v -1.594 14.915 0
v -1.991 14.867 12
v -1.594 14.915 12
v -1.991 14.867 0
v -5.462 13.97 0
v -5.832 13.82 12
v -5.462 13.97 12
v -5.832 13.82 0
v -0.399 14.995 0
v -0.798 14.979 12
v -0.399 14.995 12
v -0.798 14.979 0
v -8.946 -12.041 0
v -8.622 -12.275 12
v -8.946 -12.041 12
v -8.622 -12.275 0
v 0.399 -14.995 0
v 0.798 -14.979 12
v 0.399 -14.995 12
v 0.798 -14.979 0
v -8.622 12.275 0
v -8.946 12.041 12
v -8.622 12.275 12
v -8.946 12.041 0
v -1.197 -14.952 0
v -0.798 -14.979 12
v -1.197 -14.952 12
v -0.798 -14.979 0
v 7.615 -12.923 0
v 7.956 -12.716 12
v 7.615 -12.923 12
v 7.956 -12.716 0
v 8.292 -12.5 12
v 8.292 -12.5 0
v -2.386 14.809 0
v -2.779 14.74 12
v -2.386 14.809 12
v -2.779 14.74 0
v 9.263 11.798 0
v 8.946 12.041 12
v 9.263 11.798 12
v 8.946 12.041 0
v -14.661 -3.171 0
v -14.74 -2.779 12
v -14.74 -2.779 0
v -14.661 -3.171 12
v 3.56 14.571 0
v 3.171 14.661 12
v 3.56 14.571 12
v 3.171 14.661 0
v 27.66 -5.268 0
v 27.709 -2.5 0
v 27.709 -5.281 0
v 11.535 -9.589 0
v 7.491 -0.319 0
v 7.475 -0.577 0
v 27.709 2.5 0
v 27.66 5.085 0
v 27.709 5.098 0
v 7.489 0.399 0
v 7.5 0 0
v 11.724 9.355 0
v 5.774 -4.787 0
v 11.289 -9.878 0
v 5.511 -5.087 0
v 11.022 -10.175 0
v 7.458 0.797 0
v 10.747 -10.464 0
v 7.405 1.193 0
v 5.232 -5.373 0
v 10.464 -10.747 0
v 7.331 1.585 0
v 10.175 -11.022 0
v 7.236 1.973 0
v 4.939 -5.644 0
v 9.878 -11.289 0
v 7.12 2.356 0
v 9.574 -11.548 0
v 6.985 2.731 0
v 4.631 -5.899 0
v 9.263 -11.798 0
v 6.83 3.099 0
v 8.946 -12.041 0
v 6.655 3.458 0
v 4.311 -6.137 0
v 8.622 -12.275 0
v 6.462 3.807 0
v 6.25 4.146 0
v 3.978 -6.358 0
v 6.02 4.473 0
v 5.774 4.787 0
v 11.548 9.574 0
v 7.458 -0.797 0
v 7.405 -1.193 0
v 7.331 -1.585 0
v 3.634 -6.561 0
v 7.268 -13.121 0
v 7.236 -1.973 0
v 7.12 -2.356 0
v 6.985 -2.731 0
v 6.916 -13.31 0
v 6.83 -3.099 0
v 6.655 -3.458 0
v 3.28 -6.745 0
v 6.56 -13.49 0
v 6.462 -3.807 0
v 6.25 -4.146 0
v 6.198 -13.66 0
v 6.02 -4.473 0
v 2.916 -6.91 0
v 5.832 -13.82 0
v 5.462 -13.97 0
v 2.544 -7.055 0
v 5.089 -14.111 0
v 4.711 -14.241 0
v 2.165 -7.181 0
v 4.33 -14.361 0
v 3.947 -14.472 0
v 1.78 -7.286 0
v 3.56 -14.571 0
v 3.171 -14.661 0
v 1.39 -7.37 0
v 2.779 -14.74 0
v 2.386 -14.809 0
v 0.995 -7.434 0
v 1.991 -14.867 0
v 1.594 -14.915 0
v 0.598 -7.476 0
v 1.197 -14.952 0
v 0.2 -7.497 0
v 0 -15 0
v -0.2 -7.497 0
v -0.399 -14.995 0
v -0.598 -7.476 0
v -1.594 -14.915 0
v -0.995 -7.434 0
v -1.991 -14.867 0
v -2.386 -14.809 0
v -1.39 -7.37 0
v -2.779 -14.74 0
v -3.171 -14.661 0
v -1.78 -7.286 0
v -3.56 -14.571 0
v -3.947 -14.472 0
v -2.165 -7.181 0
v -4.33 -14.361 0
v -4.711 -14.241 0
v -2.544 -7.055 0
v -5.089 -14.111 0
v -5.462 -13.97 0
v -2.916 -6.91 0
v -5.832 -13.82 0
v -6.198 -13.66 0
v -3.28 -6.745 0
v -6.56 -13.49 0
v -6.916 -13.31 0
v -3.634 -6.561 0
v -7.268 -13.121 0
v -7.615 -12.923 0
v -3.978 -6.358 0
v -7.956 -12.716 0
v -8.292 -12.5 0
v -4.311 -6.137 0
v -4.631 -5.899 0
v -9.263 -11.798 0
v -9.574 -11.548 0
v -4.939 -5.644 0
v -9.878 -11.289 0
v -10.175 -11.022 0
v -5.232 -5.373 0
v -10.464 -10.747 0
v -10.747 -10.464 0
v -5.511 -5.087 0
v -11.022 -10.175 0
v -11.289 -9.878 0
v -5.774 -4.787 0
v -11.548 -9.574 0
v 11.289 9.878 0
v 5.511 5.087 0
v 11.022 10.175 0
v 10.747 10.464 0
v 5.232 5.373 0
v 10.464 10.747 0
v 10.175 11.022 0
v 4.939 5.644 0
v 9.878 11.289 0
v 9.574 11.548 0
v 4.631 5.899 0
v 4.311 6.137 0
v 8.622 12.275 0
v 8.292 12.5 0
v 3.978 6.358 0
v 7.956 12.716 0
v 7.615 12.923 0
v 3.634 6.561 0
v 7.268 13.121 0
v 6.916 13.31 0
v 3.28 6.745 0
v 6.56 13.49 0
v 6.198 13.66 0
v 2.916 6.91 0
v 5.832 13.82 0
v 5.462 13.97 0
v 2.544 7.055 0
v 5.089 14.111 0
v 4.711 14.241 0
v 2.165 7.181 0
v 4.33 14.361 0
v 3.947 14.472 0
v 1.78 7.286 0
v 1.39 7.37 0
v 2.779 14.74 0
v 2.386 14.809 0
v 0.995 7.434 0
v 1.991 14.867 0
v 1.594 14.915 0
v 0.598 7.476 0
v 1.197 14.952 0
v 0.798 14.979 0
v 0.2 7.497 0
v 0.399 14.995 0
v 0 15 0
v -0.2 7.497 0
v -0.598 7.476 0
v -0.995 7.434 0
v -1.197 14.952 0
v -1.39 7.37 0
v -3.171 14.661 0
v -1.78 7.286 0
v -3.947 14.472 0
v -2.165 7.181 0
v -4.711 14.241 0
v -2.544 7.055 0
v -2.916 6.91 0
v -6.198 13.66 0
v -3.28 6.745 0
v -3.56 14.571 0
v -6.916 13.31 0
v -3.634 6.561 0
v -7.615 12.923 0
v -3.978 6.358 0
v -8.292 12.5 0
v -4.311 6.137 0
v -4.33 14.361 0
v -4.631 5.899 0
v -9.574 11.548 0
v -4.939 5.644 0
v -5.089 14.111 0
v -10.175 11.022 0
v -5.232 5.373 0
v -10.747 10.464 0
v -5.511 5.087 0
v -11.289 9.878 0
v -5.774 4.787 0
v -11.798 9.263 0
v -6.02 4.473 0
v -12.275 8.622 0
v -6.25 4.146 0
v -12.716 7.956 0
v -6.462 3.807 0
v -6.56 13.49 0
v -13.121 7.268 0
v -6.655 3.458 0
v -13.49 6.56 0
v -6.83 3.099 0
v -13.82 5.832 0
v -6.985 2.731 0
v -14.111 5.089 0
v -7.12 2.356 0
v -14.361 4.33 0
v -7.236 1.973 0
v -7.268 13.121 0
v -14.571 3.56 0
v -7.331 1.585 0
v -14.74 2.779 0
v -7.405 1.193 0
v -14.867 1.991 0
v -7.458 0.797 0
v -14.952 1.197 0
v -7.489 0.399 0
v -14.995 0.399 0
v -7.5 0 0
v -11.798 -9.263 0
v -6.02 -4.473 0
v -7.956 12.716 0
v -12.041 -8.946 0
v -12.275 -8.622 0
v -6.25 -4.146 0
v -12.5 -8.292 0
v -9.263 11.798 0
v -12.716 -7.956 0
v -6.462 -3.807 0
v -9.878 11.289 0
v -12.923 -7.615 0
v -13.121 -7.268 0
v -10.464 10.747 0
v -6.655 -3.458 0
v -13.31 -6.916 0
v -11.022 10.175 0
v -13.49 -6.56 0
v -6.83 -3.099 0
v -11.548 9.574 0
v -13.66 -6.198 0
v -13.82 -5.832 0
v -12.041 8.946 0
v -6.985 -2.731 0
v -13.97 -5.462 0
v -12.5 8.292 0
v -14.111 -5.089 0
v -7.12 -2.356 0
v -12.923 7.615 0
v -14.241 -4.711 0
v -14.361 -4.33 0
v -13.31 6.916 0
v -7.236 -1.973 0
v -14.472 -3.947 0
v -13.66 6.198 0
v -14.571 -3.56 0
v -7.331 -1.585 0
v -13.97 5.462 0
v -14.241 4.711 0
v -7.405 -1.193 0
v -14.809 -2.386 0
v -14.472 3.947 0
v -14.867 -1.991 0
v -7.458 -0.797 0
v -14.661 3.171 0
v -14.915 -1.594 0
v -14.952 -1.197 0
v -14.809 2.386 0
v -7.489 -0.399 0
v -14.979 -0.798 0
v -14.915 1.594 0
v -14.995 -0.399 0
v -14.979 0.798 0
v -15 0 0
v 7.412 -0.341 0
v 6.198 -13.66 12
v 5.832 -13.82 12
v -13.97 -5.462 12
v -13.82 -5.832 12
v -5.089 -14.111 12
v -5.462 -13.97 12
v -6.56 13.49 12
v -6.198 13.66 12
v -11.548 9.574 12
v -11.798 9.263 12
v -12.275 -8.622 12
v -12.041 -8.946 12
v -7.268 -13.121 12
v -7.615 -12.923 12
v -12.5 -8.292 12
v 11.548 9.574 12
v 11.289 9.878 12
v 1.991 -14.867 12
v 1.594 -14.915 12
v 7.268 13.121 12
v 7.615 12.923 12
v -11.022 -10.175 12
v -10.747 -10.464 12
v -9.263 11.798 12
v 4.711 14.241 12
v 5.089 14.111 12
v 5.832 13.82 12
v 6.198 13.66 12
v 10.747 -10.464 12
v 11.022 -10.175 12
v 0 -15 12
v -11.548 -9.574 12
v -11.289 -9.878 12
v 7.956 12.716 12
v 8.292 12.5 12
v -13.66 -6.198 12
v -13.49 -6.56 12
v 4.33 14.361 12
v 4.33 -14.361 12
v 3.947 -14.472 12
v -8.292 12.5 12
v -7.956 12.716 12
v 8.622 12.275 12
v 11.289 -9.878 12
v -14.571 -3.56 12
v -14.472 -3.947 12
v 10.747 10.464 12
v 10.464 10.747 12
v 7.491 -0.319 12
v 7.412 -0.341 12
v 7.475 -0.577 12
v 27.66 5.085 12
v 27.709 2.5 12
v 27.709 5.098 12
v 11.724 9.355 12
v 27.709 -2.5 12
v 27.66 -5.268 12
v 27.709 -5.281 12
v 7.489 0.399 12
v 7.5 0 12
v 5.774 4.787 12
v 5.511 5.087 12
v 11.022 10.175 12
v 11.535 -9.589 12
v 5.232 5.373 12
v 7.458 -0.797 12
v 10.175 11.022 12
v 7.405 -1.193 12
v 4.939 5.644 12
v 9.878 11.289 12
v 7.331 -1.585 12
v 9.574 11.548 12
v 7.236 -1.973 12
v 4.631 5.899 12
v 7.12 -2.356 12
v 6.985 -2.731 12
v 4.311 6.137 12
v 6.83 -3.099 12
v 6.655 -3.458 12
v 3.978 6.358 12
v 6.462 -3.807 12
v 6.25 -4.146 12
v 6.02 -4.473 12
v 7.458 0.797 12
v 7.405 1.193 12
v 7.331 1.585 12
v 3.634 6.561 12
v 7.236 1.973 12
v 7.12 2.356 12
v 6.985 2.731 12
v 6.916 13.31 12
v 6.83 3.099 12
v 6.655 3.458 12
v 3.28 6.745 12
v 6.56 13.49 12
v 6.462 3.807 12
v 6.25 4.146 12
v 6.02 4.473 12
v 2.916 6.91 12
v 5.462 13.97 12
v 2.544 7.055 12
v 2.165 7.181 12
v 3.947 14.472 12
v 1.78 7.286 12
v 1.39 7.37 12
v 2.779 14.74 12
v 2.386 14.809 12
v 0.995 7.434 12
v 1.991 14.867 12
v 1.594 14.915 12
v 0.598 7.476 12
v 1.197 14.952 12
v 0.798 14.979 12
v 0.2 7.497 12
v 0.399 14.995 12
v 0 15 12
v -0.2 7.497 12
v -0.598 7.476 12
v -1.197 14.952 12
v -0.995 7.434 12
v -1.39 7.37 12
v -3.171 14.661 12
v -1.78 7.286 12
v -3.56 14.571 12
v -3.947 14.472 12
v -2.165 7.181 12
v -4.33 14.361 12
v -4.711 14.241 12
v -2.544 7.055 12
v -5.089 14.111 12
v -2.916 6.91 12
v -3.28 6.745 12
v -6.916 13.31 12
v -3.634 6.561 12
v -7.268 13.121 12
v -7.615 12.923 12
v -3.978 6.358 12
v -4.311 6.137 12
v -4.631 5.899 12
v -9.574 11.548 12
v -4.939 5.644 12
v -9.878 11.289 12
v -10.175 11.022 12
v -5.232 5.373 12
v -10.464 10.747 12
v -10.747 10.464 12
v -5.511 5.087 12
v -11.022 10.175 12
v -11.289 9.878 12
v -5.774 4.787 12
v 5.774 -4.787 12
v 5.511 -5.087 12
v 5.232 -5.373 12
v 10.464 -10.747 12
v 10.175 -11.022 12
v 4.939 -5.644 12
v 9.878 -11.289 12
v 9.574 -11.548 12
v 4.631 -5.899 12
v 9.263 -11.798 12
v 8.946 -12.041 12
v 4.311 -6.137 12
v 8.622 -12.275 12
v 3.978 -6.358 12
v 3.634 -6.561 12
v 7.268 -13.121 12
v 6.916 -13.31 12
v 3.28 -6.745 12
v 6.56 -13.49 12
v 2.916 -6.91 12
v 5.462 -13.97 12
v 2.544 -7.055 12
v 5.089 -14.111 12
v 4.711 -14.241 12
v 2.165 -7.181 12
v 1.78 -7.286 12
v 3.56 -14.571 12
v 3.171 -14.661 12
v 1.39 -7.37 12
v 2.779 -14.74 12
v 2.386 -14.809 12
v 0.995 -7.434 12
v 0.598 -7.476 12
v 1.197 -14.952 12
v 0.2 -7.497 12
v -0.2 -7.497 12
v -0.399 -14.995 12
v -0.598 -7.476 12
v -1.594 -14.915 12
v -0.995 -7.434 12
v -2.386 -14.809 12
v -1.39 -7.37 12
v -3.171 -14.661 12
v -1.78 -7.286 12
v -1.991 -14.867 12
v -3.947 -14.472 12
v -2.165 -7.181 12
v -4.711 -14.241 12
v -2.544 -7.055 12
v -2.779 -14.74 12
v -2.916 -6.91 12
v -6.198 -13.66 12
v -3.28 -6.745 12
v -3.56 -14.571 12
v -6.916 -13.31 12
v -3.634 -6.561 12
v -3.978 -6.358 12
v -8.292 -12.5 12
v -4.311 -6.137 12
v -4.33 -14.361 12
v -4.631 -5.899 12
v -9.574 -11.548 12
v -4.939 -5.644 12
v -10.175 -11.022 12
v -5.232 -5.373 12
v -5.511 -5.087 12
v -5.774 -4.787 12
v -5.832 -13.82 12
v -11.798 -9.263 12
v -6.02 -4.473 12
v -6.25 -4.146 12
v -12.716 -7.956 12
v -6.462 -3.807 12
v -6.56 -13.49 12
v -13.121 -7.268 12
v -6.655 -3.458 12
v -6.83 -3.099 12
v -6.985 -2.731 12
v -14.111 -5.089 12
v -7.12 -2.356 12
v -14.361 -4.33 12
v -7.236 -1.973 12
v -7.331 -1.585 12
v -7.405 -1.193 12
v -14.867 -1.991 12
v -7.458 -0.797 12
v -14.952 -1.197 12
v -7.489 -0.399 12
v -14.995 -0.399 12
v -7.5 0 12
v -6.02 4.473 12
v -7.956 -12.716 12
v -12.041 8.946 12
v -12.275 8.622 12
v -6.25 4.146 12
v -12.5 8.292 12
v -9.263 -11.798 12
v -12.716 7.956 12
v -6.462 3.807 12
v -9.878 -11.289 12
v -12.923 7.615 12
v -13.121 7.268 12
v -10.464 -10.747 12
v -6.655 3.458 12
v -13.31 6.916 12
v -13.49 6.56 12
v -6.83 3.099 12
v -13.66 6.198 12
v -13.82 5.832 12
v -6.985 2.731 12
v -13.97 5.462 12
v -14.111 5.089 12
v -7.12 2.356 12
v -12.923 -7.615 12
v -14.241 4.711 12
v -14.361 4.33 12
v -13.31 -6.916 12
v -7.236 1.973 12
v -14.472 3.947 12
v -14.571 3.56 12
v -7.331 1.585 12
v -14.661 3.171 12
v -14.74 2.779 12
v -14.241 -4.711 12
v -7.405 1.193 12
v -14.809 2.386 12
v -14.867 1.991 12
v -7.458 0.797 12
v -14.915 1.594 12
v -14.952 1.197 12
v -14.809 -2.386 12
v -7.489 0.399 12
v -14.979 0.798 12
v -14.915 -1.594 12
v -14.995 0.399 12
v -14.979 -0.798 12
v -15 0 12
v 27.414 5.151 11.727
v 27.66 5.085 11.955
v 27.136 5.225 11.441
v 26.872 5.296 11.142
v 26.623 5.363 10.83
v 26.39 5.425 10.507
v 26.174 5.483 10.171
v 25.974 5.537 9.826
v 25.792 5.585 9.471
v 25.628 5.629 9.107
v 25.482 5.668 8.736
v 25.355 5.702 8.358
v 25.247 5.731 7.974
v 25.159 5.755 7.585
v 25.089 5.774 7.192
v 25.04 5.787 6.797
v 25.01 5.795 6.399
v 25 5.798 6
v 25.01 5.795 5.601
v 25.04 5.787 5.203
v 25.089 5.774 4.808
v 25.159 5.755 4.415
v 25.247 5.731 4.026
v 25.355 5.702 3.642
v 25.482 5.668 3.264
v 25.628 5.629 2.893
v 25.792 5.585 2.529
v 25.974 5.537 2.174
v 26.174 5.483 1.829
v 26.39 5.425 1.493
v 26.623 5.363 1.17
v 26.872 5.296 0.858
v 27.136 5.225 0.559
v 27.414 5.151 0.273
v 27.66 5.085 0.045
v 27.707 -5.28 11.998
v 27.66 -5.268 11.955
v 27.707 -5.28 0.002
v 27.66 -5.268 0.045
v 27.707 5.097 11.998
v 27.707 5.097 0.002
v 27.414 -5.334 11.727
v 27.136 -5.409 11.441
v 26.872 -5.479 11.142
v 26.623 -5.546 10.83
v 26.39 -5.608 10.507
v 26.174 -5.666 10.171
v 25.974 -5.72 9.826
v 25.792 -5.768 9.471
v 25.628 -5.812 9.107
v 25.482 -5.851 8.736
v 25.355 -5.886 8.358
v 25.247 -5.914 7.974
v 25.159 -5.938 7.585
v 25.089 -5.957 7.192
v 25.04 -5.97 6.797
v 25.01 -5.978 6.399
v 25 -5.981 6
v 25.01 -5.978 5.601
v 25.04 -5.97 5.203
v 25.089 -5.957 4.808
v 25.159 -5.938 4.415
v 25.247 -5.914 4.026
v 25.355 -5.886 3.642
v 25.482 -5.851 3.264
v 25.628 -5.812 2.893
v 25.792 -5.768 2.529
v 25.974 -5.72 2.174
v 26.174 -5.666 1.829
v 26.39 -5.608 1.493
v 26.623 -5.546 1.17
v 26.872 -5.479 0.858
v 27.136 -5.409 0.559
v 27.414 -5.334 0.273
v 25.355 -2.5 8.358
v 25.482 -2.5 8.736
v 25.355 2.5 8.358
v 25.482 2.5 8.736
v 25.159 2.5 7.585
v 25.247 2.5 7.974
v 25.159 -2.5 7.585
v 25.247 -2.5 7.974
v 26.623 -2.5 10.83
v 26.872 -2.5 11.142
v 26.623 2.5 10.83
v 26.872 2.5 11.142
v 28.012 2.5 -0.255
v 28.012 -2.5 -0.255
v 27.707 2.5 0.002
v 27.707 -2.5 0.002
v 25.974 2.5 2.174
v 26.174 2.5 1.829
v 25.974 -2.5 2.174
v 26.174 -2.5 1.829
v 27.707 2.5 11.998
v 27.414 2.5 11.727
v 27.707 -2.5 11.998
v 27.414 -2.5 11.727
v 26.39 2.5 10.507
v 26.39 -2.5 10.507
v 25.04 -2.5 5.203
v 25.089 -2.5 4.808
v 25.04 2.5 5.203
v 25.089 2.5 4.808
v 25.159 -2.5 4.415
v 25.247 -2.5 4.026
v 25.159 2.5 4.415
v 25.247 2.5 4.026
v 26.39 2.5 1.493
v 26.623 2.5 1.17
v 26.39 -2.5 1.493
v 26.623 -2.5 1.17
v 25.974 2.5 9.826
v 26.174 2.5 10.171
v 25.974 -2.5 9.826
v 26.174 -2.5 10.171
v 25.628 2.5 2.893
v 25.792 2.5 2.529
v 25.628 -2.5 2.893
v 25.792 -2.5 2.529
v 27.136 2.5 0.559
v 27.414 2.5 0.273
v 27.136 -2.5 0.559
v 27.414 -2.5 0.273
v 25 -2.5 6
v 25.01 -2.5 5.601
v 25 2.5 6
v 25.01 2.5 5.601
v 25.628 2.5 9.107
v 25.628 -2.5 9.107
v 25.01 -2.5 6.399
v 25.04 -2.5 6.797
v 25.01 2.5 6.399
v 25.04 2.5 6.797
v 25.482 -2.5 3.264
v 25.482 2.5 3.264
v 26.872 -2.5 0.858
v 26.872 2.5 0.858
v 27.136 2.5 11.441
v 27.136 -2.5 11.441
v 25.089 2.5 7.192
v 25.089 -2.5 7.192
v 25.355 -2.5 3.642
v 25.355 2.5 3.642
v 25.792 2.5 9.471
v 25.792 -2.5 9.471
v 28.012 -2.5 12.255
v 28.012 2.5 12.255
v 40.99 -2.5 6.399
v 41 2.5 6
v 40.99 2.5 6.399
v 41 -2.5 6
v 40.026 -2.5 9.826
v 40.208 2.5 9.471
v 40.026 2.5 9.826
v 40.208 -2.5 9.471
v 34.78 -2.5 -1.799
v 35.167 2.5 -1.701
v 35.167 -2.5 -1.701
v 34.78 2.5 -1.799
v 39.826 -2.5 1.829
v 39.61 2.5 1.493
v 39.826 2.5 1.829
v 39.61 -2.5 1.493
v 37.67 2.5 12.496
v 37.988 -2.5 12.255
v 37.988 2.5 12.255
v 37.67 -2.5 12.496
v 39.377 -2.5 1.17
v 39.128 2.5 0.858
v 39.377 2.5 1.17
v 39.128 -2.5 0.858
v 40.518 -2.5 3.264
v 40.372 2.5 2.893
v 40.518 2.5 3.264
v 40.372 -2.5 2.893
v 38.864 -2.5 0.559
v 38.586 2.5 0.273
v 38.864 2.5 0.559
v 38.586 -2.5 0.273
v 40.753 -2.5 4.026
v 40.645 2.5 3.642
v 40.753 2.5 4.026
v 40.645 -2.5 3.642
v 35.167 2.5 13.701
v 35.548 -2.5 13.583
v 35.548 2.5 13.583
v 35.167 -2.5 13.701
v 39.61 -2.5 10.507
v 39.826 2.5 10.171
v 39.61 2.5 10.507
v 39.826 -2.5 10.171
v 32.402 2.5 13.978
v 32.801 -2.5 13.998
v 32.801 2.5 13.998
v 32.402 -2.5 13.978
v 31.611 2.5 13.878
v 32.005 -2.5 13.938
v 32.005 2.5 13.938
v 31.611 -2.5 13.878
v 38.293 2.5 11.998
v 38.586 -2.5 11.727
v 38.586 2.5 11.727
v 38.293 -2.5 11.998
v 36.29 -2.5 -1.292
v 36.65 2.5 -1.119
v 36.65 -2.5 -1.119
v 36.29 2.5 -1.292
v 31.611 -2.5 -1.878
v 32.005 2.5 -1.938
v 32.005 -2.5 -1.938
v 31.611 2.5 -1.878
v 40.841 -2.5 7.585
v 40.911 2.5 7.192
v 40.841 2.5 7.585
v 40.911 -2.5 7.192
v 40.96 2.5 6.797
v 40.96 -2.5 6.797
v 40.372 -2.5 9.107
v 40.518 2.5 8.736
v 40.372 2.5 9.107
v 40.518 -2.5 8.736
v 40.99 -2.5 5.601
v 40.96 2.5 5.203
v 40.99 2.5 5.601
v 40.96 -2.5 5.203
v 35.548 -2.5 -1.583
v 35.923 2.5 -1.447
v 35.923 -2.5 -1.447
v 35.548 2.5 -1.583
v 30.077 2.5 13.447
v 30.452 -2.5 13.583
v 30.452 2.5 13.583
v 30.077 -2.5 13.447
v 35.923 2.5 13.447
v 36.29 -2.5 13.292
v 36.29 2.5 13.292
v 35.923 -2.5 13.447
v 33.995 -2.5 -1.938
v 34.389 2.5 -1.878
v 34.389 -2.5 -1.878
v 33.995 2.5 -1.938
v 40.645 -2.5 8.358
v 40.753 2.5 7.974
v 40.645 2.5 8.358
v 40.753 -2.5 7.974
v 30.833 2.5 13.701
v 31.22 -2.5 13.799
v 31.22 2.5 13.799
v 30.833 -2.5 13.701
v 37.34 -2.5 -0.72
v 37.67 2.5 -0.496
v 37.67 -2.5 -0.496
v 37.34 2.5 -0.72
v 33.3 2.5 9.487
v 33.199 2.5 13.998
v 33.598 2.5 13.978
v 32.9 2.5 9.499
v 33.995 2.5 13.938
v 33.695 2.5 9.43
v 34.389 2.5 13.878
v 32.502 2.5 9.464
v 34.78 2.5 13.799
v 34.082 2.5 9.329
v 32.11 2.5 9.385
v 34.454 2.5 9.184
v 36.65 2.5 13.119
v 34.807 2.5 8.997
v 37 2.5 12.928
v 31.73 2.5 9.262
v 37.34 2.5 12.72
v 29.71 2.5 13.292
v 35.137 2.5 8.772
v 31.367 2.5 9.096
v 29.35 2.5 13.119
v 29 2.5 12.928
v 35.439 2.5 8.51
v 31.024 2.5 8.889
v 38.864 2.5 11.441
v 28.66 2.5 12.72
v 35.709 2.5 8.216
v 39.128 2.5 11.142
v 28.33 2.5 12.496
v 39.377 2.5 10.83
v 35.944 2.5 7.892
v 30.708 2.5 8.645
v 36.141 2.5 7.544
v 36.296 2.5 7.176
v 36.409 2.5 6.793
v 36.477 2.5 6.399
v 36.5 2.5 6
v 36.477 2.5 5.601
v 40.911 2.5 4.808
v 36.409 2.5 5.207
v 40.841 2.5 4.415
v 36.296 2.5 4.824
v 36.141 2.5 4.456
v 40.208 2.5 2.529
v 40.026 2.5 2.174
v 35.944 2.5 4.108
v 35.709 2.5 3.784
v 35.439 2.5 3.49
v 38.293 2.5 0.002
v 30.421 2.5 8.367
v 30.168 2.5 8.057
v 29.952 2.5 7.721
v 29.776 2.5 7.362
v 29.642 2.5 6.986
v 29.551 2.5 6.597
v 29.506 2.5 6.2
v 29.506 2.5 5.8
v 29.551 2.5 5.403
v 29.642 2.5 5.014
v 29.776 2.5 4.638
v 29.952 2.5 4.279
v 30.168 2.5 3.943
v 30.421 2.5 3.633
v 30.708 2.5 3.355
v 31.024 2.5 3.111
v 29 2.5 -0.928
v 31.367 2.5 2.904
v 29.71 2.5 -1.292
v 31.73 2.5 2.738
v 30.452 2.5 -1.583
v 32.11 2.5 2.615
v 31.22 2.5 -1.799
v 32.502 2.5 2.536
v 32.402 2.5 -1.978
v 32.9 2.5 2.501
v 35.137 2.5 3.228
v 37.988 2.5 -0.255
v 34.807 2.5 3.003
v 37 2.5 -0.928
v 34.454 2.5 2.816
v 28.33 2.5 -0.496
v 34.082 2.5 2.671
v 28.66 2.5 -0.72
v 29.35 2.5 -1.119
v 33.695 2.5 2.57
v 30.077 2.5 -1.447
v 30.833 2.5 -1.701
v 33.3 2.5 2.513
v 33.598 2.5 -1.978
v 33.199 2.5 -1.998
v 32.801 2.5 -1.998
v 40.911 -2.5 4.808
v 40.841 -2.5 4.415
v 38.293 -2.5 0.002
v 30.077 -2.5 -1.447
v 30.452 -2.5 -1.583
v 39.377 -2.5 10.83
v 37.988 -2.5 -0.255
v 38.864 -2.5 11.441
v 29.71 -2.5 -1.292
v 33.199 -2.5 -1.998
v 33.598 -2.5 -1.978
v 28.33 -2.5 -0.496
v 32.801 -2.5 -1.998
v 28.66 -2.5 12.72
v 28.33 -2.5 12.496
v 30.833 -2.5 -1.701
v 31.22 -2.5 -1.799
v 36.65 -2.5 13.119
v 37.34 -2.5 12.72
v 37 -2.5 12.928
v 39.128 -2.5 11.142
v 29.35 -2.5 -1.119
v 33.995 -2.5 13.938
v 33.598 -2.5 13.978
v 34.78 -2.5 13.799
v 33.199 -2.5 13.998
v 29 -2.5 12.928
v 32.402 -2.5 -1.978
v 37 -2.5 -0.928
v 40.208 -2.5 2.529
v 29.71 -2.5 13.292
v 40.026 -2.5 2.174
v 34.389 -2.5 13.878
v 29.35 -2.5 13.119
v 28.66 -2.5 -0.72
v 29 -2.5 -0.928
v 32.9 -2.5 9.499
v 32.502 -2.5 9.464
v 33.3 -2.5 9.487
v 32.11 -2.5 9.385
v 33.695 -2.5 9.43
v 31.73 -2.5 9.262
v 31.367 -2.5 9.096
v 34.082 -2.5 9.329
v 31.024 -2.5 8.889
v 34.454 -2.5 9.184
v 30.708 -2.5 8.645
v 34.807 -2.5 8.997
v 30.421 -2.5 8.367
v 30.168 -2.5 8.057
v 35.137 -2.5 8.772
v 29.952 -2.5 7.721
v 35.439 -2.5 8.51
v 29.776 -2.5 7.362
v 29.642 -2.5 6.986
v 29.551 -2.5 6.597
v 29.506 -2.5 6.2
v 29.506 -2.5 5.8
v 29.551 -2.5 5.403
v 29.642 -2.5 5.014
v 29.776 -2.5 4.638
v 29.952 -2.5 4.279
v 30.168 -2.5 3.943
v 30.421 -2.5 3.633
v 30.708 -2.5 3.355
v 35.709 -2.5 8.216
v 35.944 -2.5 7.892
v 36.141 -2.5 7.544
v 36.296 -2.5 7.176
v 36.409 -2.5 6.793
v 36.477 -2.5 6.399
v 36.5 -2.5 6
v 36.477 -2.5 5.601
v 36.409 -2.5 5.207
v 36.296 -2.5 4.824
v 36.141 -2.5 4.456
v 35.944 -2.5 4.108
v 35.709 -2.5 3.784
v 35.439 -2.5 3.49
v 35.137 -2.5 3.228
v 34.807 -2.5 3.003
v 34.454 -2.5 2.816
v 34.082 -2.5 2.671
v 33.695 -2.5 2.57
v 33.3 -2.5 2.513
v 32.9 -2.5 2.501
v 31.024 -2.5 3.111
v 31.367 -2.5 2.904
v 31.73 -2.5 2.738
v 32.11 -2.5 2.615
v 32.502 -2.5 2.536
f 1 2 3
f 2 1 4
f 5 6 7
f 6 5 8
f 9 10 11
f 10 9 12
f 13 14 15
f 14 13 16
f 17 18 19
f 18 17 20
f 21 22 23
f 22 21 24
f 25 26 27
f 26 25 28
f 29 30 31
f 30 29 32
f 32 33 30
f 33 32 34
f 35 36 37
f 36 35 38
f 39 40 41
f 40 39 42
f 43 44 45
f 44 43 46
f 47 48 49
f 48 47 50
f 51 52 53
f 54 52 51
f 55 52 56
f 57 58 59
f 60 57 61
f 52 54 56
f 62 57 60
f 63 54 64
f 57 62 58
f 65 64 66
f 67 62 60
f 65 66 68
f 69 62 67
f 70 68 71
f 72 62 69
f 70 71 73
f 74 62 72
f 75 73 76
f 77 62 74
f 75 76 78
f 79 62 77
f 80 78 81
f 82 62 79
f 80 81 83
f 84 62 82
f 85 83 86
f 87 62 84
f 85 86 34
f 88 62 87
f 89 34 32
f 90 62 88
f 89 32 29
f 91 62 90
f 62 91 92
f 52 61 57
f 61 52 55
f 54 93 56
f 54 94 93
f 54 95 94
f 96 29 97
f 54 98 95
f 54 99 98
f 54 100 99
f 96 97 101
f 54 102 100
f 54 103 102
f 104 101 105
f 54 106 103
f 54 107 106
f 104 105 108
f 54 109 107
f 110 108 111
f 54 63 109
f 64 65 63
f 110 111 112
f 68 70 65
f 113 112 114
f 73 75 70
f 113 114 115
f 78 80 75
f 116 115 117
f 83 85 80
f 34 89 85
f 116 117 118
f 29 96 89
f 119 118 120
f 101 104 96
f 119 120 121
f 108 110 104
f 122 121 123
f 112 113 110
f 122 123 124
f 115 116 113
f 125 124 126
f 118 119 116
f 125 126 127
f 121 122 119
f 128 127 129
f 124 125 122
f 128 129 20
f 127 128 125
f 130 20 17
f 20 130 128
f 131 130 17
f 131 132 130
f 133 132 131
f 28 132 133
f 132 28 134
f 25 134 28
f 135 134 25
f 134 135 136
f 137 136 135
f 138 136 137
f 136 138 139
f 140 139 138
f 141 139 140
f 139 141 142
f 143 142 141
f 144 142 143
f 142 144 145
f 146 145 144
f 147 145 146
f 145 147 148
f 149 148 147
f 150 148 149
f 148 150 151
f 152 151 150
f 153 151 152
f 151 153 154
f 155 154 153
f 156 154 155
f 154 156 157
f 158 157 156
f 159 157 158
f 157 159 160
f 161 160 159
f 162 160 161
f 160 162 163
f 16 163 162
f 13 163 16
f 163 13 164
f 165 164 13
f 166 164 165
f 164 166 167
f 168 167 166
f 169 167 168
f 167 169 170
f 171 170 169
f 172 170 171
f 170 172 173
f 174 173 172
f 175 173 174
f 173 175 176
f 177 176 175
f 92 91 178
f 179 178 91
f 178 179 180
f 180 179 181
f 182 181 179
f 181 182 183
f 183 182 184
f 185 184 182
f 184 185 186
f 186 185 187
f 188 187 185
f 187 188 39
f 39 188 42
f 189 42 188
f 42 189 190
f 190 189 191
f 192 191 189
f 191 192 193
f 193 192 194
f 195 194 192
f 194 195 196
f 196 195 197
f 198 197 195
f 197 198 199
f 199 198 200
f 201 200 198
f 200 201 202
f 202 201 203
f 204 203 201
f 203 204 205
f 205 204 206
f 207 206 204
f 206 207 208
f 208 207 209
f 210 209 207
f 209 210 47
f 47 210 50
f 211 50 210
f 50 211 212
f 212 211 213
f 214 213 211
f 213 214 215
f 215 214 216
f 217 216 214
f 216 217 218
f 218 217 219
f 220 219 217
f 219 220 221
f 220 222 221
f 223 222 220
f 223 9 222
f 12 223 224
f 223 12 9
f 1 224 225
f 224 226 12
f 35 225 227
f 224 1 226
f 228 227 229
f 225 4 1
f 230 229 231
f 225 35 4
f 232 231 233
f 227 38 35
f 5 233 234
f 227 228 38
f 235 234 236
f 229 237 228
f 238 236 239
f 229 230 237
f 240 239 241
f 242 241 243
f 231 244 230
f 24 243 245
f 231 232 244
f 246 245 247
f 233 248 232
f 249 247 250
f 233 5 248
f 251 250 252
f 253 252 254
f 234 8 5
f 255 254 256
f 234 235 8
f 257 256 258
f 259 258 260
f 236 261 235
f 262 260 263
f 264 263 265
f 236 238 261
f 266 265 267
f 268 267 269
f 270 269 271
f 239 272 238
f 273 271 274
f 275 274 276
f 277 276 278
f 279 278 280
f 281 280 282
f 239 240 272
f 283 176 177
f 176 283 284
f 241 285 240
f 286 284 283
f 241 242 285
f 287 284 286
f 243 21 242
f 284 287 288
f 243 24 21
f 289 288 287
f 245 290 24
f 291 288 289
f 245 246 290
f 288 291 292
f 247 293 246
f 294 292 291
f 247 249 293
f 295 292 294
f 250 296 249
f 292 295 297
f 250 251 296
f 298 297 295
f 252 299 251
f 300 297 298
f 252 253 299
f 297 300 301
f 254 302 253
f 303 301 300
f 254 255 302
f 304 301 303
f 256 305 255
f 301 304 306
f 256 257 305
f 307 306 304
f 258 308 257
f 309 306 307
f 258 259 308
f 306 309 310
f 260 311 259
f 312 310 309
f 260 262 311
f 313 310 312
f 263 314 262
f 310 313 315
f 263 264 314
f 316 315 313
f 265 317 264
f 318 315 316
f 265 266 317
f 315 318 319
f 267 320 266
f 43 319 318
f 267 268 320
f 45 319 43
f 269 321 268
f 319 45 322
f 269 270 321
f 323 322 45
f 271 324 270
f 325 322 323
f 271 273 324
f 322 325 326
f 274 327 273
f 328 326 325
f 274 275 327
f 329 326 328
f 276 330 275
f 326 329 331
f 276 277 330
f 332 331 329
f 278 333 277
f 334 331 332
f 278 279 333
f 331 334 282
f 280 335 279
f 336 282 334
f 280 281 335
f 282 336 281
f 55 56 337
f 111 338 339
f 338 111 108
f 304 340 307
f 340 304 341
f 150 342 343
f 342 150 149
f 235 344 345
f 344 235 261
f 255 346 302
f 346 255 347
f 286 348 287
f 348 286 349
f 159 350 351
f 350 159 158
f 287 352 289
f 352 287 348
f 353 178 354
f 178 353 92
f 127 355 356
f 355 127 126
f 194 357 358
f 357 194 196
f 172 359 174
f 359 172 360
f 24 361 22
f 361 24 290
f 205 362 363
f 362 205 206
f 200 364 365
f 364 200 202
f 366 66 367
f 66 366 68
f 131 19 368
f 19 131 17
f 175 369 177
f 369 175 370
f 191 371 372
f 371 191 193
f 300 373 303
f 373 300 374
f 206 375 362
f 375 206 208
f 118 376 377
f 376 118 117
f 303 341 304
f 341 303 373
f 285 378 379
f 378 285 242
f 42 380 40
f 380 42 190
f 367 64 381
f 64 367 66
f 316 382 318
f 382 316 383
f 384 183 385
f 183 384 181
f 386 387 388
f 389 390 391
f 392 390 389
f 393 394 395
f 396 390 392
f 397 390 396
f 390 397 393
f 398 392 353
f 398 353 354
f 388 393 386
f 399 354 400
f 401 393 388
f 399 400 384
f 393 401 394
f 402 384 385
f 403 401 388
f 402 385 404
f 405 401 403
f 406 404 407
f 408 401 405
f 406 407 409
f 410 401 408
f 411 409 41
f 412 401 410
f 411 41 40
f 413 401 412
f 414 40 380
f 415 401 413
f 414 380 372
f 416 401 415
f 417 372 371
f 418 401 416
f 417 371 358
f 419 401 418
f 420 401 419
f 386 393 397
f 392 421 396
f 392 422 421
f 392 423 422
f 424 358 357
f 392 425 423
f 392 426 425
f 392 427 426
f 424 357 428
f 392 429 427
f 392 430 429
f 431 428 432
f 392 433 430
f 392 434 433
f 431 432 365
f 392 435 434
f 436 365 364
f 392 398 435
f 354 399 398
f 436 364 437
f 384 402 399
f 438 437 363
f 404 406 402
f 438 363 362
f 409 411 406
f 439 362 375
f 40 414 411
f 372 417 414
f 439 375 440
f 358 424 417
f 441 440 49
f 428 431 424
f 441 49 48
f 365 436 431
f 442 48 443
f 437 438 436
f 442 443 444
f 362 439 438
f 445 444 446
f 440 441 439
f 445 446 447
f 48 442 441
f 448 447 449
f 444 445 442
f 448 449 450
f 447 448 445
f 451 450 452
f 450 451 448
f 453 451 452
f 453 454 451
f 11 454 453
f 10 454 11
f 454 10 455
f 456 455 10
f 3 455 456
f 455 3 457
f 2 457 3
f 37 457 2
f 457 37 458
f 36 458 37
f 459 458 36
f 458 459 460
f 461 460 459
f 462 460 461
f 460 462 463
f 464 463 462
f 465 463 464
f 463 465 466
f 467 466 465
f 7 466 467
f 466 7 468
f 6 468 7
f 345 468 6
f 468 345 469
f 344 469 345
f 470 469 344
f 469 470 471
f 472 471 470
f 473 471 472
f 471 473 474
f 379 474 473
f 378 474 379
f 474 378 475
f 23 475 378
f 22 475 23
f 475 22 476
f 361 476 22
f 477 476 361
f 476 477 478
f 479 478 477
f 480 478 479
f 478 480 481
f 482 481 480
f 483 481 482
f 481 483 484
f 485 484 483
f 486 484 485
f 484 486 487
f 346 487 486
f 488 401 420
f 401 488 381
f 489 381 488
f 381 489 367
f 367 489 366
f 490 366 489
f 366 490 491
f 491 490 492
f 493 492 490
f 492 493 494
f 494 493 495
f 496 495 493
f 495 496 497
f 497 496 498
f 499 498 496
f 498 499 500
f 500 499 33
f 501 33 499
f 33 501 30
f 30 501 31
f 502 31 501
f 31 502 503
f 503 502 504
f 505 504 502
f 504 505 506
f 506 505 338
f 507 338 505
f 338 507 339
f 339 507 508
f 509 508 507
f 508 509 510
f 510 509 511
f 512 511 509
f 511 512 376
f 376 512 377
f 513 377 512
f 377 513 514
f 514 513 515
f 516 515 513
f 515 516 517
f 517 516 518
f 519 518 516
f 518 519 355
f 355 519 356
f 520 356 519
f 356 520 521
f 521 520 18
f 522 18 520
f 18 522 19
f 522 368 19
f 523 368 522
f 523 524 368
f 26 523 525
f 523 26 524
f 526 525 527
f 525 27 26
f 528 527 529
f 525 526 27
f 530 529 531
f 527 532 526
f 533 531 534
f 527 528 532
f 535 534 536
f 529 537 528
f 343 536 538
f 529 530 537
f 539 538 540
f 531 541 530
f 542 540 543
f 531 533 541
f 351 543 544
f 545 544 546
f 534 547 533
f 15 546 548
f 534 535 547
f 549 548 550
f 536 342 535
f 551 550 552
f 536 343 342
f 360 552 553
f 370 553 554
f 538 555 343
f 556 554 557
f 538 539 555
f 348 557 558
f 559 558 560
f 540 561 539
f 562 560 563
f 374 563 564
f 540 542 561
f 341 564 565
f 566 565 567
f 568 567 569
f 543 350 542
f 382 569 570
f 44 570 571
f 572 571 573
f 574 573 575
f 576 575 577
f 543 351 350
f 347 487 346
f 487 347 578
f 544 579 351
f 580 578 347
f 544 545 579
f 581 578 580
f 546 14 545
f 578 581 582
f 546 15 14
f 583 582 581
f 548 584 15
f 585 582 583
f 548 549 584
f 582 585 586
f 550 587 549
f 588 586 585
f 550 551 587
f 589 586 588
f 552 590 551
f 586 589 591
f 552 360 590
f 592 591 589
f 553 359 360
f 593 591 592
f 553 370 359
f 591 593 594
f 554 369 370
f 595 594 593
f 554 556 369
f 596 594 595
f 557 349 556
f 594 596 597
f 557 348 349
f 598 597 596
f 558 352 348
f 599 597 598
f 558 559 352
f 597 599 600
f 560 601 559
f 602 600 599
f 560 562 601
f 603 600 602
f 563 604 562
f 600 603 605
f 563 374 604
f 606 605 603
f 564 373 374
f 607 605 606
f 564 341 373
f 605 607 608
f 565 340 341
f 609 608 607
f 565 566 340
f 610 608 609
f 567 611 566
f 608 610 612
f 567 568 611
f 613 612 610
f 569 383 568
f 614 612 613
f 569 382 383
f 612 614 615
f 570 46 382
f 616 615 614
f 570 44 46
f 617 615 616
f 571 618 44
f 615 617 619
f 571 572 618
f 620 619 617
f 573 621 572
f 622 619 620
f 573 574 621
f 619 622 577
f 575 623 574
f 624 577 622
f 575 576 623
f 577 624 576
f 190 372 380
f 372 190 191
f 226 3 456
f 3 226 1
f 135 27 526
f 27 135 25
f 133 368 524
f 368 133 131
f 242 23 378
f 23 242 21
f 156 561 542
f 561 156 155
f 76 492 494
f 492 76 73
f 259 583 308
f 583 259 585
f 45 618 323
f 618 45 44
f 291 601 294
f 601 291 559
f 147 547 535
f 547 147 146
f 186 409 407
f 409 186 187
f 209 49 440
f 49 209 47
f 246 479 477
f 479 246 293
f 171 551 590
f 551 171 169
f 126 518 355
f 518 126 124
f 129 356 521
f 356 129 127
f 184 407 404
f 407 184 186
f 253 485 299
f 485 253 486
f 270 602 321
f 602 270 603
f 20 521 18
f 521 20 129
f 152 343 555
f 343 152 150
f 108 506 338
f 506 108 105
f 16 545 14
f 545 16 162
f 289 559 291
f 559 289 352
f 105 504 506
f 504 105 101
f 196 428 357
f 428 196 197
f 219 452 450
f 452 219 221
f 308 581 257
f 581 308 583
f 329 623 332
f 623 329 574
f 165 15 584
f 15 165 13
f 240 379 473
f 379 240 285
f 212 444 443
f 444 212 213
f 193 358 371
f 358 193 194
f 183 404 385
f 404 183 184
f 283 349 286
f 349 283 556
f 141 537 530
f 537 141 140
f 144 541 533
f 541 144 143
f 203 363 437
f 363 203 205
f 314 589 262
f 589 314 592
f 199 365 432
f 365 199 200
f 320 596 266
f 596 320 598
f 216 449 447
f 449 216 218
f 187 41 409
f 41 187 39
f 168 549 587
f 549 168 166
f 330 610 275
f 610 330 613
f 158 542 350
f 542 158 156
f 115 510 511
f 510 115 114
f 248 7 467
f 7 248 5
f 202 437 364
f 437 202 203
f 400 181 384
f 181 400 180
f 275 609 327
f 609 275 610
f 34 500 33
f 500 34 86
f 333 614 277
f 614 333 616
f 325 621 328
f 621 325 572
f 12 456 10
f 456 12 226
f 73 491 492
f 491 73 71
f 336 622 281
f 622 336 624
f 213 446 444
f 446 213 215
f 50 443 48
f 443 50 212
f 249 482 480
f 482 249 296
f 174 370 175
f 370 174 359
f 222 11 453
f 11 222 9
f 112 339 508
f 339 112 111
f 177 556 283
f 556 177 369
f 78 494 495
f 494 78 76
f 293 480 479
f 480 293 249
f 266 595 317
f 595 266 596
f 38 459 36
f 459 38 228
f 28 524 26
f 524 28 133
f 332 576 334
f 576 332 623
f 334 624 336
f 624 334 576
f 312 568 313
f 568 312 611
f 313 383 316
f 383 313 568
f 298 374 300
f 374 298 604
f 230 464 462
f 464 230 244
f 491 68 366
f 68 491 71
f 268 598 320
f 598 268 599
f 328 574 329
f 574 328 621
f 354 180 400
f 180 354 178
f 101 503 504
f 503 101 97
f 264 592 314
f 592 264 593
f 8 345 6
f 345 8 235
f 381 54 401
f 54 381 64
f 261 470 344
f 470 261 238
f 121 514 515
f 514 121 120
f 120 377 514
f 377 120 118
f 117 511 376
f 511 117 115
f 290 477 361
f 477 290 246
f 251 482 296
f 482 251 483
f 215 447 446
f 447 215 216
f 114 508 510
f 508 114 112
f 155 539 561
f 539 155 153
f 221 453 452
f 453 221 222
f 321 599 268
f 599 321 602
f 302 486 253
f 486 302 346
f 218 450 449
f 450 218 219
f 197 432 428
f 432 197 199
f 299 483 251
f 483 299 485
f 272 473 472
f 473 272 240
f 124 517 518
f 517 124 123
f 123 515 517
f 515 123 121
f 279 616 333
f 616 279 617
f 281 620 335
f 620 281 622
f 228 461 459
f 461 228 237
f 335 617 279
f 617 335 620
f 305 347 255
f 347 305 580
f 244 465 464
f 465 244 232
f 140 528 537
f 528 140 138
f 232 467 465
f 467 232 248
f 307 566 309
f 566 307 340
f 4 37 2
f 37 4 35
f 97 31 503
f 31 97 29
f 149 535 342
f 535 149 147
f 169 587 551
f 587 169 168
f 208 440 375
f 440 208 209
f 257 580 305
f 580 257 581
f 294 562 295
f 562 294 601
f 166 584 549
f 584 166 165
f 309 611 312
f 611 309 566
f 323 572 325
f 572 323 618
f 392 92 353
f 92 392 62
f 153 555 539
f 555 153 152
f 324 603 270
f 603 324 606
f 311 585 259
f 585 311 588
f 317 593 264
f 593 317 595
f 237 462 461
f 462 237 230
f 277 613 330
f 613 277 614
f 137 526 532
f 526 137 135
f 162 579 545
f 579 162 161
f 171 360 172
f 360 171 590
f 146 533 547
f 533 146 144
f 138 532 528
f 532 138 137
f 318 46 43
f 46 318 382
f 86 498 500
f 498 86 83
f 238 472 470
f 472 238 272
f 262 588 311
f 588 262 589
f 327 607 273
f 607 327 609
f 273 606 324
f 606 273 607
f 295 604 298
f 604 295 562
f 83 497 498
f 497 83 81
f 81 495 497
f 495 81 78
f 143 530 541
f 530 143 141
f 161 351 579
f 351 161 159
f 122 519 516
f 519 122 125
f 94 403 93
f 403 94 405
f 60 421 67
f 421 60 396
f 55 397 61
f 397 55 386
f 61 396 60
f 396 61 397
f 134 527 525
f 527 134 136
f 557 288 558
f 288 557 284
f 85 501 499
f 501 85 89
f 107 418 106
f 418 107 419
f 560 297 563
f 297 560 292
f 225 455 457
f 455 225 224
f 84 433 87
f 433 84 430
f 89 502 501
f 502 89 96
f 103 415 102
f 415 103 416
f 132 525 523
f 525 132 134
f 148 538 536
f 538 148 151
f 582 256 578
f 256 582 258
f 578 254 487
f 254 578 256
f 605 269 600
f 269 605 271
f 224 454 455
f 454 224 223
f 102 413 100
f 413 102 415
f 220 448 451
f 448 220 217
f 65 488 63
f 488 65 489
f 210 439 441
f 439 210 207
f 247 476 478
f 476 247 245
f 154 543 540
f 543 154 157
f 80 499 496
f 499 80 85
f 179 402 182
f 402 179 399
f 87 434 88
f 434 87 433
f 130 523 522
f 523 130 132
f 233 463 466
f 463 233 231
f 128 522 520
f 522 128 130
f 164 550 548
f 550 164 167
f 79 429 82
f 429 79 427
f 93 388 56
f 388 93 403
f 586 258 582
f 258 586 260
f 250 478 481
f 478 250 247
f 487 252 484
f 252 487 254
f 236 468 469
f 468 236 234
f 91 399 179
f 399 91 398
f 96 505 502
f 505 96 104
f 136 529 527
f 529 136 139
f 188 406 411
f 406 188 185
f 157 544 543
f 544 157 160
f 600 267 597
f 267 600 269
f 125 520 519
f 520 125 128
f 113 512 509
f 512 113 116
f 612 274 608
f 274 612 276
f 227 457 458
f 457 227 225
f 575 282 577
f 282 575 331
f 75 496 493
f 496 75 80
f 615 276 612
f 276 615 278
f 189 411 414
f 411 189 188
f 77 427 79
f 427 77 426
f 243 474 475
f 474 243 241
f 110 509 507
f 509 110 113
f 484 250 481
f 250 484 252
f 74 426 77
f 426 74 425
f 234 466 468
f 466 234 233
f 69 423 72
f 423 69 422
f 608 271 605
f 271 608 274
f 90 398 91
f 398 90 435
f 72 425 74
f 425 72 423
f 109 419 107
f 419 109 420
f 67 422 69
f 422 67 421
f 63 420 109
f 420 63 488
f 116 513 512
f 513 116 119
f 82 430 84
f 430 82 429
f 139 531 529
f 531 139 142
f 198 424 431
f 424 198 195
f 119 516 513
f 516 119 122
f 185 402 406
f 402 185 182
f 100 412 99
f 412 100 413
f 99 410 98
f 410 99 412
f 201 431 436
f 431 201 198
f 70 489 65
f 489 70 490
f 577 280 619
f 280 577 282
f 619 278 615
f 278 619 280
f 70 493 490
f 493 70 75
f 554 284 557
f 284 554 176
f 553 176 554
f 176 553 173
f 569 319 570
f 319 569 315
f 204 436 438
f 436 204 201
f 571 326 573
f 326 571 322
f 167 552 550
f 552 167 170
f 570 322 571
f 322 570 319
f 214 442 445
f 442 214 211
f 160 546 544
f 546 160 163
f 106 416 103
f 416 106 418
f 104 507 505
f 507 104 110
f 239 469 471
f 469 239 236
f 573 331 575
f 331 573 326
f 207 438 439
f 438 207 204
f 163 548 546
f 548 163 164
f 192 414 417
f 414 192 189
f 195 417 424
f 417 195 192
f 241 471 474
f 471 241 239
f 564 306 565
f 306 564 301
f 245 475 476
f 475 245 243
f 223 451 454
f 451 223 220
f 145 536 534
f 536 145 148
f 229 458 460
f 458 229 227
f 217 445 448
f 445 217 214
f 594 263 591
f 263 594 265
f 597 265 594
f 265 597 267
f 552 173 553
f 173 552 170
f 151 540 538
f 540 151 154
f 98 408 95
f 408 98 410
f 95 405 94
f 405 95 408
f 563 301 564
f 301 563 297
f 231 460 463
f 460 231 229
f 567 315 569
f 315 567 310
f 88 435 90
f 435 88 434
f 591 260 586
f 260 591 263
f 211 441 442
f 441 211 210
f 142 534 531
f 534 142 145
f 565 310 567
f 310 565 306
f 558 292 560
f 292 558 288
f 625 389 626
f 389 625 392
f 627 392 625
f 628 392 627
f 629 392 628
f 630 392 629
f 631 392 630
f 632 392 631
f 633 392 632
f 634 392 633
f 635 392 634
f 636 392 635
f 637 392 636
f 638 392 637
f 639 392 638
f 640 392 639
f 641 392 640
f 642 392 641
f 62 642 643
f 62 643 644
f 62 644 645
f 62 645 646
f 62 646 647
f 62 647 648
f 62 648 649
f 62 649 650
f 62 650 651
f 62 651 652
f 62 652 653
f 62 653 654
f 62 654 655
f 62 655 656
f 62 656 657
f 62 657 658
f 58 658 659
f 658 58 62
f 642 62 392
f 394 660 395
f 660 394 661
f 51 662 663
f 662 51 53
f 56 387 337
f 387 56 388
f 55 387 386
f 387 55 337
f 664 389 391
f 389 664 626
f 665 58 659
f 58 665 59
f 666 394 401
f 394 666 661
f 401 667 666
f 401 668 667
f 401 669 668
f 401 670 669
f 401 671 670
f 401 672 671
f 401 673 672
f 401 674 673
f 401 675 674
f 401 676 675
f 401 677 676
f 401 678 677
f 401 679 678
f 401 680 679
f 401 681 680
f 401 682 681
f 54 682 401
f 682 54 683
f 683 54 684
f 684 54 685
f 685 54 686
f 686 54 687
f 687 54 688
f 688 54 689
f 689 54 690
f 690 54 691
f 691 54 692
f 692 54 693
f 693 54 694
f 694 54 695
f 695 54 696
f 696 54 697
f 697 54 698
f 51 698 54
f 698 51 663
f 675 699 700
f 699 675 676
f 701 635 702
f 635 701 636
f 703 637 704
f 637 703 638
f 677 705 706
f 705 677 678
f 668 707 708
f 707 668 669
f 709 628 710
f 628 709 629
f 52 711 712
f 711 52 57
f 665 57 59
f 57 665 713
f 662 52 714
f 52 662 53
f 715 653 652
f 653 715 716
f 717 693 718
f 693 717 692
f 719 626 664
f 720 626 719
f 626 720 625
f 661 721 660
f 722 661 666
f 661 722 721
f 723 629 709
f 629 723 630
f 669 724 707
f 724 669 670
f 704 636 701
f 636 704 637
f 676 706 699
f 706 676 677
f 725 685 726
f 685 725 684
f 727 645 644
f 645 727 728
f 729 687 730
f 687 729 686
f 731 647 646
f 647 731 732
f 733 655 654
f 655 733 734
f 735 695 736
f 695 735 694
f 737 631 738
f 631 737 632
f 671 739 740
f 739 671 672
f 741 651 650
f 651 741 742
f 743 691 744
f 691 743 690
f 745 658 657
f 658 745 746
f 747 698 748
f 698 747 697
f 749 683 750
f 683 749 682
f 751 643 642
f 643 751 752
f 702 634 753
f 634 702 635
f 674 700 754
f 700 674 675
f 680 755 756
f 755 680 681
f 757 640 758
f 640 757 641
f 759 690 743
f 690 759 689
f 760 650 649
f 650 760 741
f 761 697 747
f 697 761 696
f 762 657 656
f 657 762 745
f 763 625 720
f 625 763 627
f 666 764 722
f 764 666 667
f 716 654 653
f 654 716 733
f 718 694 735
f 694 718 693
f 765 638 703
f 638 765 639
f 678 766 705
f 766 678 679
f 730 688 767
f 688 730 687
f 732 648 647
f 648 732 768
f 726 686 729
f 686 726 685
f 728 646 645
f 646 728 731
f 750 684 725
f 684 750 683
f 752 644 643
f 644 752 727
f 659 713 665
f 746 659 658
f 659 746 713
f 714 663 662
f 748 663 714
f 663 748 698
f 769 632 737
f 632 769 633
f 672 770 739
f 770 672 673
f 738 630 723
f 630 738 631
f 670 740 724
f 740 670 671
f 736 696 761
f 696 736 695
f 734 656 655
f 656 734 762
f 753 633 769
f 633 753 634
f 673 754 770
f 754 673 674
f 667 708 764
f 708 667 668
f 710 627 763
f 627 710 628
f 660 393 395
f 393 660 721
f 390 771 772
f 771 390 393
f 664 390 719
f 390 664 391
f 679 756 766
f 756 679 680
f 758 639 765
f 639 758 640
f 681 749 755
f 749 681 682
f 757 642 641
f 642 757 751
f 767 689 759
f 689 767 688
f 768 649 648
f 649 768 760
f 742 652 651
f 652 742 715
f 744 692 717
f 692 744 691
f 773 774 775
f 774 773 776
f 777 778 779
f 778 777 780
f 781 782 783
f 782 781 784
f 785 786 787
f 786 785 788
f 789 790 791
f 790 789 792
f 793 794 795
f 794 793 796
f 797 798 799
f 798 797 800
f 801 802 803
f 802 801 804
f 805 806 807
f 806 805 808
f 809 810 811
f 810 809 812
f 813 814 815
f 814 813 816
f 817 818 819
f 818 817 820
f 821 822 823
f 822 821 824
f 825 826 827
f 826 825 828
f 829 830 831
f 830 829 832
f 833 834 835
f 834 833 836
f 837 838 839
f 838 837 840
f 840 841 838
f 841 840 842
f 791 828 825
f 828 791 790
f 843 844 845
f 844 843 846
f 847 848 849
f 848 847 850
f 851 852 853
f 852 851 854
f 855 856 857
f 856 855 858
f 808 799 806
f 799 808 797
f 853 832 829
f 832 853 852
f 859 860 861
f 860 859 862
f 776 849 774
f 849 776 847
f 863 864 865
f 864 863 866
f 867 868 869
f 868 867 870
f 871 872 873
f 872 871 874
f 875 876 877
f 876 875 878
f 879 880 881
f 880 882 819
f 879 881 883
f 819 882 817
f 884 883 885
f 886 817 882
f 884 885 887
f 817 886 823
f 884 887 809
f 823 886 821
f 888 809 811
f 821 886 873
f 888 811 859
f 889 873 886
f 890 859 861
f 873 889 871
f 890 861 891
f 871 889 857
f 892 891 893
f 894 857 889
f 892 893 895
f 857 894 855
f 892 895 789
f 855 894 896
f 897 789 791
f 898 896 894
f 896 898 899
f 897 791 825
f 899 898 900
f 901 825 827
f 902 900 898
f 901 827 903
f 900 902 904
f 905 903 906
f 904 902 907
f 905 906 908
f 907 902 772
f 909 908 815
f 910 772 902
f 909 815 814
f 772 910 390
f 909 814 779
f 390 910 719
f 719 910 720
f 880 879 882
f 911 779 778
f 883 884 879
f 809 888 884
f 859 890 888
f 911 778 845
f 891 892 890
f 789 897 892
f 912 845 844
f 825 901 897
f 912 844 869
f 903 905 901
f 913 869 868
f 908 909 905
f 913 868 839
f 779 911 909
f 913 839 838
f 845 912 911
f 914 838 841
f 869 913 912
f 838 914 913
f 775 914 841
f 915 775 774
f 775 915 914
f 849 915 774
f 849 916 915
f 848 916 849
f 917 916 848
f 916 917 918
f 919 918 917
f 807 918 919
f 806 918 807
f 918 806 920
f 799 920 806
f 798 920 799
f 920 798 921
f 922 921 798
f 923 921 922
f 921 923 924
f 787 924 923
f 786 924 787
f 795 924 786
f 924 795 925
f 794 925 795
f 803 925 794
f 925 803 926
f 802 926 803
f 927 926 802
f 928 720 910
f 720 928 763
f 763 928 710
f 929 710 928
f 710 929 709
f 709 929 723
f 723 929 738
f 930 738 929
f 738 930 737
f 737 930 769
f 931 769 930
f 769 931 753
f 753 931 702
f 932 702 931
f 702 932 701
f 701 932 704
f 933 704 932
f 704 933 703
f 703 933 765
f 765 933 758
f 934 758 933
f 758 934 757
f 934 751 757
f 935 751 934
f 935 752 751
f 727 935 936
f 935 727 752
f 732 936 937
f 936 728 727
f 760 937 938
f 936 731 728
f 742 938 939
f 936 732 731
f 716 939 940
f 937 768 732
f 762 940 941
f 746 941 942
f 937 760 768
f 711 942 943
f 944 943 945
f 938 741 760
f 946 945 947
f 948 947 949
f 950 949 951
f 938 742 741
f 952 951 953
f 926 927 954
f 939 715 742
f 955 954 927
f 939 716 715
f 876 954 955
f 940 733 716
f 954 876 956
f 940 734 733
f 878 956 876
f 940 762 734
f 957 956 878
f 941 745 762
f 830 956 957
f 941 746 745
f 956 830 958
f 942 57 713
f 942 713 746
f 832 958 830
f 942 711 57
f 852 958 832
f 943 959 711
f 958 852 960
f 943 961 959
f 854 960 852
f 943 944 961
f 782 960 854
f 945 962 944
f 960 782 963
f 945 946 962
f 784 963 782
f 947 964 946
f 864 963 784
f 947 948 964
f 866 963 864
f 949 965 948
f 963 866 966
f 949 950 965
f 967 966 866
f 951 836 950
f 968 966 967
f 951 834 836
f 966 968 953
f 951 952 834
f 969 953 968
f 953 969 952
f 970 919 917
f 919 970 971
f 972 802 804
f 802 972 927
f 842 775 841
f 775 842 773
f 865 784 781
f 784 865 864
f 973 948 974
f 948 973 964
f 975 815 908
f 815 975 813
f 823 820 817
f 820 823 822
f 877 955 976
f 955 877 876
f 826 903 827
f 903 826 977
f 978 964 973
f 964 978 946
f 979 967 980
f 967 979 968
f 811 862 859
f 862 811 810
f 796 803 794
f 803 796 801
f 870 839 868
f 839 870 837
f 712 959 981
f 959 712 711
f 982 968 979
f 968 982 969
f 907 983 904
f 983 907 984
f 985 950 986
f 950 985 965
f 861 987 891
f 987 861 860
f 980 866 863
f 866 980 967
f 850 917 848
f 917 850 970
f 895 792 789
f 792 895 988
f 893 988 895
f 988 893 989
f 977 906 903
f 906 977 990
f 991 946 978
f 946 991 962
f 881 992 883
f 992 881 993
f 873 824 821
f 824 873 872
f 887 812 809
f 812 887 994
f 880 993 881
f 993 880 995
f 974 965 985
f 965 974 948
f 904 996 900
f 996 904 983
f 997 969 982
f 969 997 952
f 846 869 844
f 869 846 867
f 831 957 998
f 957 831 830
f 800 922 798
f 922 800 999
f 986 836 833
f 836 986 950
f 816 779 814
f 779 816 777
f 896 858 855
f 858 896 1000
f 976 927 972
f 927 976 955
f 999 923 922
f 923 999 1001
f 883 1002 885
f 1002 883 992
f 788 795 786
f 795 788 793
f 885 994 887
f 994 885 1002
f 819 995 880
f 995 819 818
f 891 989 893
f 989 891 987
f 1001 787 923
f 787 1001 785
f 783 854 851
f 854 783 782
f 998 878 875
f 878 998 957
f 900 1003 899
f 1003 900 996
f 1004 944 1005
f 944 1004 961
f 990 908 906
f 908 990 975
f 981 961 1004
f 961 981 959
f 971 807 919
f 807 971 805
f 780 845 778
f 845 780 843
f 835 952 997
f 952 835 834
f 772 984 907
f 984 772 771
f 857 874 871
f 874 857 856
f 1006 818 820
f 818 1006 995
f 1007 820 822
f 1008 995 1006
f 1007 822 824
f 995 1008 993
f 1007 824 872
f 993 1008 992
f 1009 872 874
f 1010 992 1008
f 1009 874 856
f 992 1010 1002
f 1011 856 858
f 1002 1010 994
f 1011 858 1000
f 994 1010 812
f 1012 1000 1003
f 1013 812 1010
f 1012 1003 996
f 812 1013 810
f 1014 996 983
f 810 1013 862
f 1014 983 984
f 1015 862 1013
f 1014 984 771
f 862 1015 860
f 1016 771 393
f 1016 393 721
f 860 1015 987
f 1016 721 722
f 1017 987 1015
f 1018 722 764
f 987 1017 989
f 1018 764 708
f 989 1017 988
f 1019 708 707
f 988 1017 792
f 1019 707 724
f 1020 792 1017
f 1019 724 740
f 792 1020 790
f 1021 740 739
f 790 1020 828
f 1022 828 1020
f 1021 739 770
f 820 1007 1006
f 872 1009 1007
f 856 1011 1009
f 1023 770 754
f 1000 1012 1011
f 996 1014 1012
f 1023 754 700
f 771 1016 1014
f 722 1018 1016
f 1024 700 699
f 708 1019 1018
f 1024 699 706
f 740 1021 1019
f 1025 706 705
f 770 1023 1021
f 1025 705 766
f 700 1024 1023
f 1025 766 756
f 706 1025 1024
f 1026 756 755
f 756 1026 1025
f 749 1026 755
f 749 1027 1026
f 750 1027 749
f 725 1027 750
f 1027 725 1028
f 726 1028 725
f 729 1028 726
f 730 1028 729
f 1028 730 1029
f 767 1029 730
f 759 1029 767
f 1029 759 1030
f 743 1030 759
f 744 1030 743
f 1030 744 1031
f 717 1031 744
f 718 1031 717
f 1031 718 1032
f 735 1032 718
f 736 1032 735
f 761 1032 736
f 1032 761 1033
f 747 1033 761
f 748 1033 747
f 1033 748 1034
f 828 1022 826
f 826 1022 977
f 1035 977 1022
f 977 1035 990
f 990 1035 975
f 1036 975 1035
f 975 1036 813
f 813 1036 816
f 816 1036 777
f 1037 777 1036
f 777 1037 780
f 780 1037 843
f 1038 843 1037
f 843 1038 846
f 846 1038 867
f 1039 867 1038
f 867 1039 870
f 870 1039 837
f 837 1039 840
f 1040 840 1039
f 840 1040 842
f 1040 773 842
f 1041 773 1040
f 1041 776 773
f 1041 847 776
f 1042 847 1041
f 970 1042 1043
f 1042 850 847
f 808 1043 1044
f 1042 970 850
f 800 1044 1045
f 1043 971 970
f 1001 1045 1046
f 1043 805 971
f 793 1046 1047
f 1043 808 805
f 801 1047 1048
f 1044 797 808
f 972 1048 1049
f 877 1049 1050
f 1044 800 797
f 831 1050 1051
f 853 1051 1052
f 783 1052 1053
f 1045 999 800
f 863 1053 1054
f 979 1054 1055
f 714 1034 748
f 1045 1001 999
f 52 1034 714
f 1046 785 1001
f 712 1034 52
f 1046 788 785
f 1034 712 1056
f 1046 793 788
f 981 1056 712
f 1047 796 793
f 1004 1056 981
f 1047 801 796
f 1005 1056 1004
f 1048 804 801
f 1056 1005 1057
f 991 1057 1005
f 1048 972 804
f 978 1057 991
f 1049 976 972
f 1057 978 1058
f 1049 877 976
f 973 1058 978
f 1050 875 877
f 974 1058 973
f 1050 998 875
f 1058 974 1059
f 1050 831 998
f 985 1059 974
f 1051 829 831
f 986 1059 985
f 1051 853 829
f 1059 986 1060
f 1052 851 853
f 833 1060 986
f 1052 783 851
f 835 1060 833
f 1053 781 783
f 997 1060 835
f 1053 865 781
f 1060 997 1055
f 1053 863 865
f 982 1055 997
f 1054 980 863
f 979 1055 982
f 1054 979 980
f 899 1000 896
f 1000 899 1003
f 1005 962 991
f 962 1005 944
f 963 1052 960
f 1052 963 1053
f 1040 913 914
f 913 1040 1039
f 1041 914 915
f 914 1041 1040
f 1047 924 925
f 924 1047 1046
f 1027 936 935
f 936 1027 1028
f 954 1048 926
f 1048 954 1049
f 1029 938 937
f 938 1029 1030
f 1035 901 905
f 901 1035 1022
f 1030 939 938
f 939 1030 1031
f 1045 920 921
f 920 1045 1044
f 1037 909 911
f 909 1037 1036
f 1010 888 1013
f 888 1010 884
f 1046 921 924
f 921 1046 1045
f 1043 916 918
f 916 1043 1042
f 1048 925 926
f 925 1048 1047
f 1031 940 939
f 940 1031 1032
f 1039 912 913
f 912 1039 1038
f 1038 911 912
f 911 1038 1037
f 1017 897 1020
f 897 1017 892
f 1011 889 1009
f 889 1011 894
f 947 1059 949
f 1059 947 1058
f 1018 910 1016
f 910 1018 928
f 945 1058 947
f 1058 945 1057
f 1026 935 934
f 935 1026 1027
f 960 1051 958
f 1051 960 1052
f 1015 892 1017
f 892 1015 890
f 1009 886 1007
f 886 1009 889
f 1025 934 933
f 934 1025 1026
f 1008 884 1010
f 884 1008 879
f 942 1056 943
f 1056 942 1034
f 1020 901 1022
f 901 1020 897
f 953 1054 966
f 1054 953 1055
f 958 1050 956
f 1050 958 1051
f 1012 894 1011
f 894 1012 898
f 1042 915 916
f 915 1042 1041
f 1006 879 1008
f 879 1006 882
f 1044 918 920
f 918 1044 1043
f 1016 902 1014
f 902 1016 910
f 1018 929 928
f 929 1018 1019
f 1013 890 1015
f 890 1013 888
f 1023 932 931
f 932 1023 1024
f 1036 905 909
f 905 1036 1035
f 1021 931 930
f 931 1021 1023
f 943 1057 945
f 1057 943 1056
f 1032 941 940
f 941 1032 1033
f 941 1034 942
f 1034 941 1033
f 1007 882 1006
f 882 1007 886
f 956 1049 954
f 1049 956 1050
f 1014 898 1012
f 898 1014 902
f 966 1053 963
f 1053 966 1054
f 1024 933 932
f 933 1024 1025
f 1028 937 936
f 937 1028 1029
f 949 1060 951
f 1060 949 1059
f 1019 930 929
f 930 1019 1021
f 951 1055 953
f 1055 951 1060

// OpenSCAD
$fa = 1;
$fs = 0.4;

//hori();
vert();

module hori() {
   difference() {
      union() {
         difference() {
            cylinder(12, 15, 15);
            cylinder(15, 7.5, 7.5);
         }

         translate([8, 0, 0])
            rotate([0, 0, -15])
               cube([25, 10, 12]);

         translate([10, -10, 0])
            rotate([0, 0, 15])
               cube([25, 10, 12]);

         translate([30, 0, 0])
            cylinder(12, 7.5, 7.5);
      }
      
      translate([30, 0, 0])
            cylinder(3.5, 7.5, 7.5);

      translate([30, 0, 8.5])
            cylinder(3.5, 7.5, 7.5);

      translate([30, 0, 0])
            cylinder(12, 3.5, 3.5);

   }
}

module vert() {
   difference() {
      union() {
         difference() {
            cylinder(12, 15, 15);
            cylinder(15, 7.5, 7.5);
         }

         translate([8, 0, 0])
            rotate([0, 0, -15])
               cube([25, 10, 12]);

         translate([10, -10, 0])
            rotate([0, 0, 15])
               cube([25, 10, 12]);

      }
      
      translate([33, 8, 6])
         rotate([90, 0, 0])
            cylinder(16, 8, 8);
   }
   
   difference(){
      translate([33, 2.5, 6])
         rotate([90, 0, 0])
            cylinder(5, 8, 8);
      
      translate([33, 4, 6])
         rotate([90, 0, 0])
            cylinder(8, 3.5, 3.5);
      
   }
}
